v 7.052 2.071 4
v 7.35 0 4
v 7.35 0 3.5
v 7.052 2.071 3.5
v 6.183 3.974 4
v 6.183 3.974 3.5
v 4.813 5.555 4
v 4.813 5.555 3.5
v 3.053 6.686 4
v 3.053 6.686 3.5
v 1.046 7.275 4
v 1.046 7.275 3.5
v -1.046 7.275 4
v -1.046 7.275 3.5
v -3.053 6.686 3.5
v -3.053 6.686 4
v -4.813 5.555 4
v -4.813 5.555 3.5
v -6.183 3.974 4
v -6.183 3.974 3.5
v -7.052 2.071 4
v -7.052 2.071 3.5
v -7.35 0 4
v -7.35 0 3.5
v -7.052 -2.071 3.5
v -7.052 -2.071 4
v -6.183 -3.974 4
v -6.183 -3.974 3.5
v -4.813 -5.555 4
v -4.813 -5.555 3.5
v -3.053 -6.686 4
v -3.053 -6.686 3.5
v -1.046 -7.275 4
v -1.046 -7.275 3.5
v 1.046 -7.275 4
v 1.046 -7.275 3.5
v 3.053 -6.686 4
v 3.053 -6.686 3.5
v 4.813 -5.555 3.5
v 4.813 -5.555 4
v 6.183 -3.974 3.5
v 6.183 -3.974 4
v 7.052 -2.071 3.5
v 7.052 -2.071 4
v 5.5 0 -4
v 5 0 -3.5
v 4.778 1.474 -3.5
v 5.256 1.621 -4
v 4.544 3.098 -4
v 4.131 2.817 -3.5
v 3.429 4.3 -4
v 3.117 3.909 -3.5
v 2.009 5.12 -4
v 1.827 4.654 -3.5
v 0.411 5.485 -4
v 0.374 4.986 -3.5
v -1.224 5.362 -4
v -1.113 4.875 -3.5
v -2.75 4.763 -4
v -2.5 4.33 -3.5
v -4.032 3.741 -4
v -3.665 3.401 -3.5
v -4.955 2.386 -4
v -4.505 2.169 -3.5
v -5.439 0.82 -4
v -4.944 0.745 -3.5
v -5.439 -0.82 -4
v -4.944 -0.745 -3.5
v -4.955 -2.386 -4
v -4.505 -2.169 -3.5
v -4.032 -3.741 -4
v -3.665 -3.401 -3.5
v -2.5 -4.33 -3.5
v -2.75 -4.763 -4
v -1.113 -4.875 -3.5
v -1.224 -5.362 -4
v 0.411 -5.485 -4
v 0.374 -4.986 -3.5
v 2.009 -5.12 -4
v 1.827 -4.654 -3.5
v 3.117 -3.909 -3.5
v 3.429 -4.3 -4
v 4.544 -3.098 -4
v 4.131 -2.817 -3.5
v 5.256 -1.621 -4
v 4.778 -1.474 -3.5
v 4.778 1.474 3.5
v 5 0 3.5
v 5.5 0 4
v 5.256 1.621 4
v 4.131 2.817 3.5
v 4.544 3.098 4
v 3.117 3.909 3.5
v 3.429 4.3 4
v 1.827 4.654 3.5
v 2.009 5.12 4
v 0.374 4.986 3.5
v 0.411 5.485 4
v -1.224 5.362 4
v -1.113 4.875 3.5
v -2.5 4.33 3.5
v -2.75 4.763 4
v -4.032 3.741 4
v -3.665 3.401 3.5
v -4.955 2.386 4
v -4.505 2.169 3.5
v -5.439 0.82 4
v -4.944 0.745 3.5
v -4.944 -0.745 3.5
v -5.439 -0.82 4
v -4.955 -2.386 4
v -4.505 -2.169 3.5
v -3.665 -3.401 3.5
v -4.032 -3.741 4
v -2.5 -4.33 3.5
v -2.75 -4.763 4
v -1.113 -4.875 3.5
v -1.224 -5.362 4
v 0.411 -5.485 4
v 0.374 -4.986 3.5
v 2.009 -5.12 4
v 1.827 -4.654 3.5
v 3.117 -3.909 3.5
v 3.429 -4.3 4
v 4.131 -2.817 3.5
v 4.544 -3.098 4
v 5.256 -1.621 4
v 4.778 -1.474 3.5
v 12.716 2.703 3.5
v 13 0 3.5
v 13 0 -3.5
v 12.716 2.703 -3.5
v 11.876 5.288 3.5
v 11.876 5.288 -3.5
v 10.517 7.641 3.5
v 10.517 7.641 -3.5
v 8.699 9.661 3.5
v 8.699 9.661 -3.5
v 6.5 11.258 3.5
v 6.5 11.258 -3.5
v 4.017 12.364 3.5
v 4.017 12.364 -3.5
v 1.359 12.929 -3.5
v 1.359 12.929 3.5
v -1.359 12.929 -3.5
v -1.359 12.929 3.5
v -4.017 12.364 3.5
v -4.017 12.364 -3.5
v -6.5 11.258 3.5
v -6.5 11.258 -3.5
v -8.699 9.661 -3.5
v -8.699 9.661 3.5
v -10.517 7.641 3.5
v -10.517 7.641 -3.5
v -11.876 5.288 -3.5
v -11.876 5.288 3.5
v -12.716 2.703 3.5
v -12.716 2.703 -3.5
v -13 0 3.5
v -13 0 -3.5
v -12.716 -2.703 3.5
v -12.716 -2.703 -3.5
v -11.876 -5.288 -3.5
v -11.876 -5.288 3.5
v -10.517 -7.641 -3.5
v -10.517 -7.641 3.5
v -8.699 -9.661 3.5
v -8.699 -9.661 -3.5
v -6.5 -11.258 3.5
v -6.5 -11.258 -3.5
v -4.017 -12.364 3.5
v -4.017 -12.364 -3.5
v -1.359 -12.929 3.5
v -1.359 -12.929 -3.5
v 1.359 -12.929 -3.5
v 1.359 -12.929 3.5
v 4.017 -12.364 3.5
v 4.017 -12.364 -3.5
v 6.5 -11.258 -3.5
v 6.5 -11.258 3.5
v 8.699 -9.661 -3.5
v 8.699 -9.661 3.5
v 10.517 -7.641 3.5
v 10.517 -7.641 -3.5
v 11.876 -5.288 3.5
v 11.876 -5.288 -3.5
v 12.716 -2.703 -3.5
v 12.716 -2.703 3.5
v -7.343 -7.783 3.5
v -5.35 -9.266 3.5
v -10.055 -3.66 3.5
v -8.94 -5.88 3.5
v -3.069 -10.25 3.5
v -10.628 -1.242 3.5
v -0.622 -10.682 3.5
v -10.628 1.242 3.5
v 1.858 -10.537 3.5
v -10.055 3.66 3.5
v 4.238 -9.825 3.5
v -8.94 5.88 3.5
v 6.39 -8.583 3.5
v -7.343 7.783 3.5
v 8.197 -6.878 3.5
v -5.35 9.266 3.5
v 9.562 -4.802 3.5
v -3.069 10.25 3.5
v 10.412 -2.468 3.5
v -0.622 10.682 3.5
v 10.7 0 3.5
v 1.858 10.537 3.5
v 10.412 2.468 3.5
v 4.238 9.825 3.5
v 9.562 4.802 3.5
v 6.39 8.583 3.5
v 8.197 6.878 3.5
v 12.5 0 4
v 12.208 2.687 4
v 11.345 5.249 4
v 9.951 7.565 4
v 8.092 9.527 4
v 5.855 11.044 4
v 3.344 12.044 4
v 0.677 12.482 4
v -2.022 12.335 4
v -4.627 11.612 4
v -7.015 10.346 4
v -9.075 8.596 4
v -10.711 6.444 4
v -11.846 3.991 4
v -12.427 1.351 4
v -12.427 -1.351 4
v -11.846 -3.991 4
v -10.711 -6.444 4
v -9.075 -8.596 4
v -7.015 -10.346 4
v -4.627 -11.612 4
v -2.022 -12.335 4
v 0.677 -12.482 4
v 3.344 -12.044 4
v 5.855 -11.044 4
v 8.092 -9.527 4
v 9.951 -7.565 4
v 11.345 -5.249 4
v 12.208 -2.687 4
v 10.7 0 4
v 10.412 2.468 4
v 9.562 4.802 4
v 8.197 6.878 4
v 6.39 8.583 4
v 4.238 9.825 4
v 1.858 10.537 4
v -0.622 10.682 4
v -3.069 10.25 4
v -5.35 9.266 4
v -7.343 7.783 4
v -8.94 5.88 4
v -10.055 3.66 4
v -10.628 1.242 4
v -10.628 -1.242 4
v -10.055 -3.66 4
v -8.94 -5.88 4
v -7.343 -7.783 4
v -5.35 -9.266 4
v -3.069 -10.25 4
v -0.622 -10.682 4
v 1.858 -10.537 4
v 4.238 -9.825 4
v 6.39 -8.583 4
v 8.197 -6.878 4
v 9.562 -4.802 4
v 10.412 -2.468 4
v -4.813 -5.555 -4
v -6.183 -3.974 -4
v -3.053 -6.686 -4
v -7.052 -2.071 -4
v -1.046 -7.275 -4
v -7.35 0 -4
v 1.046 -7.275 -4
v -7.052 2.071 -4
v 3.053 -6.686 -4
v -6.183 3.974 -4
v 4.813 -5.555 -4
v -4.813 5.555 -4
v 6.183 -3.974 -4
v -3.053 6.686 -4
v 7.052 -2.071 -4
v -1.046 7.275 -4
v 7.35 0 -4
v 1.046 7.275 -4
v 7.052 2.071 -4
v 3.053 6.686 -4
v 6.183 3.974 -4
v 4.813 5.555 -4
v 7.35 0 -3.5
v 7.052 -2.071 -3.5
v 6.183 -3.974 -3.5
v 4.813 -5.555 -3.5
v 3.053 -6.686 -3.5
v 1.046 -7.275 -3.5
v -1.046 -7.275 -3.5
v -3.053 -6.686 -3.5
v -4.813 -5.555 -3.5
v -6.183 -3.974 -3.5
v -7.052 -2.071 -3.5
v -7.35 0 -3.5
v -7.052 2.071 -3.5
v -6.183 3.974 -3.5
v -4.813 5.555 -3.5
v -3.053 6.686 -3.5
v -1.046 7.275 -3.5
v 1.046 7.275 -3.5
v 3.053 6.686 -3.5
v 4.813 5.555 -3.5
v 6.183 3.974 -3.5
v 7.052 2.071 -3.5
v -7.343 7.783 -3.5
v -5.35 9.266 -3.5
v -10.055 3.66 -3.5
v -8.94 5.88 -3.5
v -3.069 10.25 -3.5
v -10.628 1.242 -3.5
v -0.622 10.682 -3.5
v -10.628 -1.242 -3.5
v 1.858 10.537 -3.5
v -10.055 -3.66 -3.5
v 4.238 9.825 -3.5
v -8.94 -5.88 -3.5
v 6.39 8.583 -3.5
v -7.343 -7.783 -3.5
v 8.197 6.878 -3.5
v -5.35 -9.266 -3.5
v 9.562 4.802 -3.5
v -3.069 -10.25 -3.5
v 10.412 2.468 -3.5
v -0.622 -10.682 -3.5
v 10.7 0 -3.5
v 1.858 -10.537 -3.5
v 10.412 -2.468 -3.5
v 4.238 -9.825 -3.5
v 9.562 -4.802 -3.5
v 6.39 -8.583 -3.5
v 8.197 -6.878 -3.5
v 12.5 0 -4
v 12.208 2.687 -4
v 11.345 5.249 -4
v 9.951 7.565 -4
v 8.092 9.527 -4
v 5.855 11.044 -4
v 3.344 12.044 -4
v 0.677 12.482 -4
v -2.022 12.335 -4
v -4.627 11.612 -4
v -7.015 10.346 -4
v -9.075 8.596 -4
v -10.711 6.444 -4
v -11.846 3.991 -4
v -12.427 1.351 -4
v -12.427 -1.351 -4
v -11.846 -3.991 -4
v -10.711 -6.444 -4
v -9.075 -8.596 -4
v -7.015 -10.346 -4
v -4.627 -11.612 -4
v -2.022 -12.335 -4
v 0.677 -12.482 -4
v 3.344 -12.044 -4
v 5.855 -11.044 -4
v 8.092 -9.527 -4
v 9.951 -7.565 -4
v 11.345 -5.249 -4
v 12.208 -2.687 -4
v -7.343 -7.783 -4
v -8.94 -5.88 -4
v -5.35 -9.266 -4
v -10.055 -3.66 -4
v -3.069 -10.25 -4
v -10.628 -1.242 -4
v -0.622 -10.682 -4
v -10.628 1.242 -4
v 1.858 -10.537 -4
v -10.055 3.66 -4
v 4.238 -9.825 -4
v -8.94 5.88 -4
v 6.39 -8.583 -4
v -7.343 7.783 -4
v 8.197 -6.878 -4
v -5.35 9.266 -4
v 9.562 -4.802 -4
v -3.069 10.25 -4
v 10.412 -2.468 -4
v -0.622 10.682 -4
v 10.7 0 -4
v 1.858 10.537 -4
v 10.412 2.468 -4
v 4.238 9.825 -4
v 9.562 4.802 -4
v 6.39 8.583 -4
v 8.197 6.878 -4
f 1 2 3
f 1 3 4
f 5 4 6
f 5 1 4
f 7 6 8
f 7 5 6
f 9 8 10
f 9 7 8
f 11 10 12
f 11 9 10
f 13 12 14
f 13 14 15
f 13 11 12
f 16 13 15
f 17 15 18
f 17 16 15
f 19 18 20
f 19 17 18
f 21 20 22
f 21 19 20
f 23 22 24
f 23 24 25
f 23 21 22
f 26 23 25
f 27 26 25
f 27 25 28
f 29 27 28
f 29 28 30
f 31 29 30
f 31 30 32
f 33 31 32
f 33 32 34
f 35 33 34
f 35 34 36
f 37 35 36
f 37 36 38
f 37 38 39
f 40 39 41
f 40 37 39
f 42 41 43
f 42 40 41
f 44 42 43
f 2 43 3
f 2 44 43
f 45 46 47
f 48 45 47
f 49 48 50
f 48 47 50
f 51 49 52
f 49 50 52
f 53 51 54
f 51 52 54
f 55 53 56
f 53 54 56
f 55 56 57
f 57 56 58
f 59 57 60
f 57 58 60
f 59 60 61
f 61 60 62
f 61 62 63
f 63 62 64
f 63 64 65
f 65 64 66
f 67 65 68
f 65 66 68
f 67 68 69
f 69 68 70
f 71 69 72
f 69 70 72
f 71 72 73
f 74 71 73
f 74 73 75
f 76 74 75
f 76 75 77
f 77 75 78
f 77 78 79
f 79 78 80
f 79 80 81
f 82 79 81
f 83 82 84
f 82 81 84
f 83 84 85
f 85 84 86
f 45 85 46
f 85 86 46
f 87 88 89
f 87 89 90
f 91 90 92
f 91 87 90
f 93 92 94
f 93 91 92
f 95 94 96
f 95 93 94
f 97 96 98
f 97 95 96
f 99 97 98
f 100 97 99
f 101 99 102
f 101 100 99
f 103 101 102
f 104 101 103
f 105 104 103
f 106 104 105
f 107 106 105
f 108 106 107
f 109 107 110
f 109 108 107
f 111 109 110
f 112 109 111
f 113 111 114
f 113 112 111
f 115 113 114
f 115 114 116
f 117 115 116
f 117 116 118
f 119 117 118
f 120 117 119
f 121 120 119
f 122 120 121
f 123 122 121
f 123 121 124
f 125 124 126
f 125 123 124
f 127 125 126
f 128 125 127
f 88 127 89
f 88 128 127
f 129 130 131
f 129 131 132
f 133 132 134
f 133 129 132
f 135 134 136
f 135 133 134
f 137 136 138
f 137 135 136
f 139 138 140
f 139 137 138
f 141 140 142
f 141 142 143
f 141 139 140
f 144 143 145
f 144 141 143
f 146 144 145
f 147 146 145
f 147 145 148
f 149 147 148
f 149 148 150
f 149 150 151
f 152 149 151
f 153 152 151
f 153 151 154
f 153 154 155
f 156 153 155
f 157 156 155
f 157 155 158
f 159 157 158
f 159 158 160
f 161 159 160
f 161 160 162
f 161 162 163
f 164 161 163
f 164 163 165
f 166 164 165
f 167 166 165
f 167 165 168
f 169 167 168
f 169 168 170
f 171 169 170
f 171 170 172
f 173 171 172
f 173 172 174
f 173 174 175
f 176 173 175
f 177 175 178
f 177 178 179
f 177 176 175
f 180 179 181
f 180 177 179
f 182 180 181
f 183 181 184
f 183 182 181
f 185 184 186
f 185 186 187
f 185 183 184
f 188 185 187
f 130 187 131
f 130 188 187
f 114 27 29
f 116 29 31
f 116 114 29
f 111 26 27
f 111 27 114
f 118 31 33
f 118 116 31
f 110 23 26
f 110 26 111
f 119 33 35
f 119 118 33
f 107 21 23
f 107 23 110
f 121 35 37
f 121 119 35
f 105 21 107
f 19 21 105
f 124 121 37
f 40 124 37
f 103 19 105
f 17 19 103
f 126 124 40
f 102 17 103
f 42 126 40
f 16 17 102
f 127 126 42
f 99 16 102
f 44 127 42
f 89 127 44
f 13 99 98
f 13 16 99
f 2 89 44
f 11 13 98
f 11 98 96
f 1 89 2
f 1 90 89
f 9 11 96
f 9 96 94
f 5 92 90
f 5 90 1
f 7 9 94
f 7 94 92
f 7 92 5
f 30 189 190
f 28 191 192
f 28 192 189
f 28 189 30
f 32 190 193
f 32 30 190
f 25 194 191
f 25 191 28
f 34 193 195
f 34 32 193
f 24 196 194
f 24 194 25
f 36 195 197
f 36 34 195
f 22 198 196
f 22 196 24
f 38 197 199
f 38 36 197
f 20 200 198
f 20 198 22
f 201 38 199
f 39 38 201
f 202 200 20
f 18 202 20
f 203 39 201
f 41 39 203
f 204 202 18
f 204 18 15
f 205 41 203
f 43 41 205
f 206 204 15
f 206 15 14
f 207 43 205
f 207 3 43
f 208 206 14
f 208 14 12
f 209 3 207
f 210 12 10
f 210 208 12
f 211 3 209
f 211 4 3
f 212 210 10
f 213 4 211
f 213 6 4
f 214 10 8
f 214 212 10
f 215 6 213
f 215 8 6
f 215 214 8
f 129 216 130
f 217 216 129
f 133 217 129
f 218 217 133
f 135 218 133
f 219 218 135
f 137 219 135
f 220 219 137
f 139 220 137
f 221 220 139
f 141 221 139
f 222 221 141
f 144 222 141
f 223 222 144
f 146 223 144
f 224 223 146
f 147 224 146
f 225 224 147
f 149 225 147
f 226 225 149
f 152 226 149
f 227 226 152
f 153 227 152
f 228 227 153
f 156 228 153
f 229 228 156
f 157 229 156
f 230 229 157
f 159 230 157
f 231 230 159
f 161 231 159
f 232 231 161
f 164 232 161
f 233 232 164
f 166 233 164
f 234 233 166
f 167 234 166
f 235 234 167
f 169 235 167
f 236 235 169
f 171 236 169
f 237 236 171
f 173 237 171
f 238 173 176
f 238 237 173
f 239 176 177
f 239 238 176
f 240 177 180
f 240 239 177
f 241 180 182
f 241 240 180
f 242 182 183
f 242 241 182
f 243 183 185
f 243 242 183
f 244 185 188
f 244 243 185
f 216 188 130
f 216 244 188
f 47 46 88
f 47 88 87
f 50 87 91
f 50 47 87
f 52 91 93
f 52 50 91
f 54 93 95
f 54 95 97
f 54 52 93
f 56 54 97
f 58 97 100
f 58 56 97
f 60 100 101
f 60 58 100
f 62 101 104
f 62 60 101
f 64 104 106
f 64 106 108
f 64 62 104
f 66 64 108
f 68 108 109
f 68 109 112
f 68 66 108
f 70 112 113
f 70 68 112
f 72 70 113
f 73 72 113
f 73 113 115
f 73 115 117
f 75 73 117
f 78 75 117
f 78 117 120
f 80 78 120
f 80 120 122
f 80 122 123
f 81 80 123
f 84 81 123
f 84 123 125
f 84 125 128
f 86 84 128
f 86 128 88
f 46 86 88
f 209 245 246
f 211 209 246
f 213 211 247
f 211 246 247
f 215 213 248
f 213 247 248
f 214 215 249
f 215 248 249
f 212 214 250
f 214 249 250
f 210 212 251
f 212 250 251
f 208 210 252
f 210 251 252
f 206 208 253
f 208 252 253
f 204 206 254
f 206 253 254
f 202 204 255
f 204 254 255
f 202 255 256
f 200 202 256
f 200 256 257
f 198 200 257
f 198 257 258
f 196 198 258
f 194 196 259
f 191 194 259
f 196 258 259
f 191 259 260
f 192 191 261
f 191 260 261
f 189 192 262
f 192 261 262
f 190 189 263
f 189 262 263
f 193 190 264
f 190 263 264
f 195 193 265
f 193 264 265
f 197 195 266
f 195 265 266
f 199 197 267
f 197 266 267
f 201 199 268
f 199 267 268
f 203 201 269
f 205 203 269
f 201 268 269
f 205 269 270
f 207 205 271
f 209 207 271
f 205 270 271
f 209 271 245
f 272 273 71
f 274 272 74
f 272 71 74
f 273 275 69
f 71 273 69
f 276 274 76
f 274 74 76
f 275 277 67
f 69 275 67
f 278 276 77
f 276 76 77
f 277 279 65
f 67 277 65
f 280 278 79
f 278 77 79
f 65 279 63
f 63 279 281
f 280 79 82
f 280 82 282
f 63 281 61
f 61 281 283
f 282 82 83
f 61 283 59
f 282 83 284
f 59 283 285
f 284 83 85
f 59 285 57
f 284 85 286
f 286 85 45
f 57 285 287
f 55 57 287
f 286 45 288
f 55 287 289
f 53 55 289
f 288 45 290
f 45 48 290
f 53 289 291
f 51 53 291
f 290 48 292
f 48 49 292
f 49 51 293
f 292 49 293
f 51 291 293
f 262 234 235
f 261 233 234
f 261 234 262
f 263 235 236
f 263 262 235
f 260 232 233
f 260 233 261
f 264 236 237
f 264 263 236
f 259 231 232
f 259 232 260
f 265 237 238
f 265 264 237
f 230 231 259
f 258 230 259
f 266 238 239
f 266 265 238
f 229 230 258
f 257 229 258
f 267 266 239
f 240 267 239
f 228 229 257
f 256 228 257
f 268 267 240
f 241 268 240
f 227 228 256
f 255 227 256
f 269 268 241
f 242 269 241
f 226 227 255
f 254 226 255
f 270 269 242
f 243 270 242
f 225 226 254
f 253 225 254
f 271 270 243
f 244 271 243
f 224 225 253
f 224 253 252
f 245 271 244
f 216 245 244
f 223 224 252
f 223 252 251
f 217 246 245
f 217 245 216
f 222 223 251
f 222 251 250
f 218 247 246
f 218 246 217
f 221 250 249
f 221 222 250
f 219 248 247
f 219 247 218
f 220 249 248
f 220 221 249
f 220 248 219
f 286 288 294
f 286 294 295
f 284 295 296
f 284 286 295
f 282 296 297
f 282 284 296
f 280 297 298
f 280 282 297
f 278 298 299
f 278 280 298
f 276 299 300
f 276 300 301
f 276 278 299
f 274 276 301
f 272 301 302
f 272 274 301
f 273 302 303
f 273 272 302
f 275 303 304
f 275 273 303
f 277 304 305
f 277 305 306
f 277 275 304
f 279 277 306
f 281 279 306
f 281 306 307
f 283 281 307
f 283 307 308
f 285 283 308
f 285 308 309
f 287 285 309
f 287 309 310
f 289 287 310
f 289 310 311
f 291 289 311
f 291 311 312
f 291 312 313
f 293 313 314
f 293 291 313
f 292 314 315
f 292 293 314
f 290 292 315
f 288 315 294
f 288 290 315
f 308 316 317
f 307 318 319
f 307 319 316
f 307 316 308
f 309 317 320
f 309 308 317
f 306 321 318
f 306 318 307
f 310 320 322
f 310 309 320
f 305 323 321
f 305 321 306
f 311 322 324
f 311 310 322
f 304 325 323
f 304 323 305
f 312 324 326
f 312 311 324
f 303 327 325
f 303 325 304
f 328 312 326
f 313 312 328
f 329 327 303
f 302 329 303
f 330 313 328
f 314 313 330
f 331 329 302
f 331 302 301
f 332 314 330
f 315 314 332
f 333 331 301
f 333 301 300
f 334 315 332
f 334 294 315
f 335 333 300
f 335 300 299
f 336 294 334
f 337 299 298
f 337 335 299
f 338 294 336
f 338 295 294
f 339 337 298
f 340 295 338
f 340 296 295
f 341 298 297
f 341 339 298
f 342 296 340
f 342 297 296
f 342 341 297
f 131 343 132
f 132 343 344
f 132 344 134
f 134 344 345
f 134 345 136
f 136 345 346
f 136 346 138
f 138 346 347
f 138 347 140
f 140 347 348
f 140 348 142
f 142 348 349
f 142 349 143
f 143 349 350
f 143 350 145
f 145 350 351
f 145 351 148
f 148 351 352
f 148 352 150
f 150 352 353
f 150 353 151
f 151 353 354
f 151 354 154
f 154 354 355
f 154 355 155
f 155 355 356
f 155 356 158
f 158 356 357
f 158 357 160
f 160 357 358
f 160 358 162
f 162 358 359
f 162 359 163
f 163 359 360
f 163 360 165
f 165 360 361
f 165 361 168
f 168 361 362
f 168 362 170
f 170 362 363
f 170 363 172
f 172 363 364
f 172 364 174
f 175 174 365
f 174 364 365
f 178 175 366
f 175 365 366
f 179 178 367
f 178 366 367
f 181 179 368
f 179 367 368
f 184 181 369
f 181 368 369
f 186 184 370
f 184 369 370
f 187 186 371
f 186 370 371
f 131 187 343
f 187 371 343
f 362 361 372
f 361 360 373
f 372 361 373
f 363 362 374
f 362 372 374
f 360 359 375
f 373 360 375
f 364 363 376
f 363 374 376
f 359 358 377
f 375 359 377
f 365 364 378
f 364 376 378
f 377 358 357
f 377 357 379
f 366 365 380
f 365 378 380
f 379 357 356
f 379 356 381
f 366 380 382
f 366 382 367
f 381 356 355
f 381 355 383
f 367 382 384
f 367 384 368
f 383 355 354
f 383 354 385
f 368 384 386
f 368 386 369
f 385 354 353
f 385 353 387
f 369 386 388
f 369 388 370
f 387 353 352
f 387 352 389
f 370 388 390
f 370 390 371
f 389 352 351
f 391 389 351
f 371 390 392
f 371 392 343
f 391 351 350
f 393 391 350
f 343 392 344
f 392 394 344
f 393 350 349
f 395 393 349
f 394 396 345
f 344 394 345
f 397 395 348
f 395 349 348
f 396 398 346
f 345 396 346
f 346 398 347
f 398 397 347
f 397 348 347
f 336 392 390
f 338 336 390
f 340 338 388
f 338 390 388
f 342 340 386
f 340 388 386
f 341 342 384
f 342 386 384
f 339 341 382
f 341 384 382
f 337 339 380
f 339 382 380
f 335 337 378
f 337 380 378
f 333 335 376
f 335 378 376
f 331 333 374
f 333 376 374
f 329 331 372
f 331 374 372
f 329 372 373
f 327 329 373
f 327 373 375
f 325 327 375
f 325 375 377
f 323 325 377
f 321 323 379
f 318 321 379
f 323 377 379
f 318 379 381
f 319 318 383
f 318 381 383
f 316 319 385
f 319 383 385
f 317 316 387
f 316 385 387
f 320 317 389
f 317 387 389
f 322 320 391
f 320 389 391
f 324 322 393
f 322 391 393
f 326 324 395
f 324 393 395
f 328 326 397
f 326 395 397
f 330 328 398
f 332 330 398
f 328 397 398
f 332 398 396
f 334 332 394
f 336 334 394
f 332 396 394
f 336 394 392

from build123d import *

# Parameters (mm, degrees)
F0_R     = 13
F0_R_2   = 5
F1_DEPTH = 4
F2_R     = 10.7
F2_R_2   = 7.35
F3_DEPTH = 0.5
F4_R     = 10.7
F4_R_2   = 7.35
F5_DEPTH = 0.5
F6_SIZE  = 0.5


with BuildPart() as f1:
    # F0 (on Top) → F1 (new body, symmetric)
    with BuildSketch(Plane.XY):
        Circle(F0_R)
        Circle(F0_R_2, mode=Mode.SUBTRACT)
    extrude(amount=F1_DEPTH, both=True)

    # F2 (on face) → F3 (cut)
    with BuildSketch(Plane(origin=(0, 0, -4), x_dir=(1, 0, 0), z_dir=(0, 0, -1))):
        Circle(F2_R)
        Circle(F2_R_2, mode=Mode.SUBTRACT)
    extrude(amount=-F3_DEPTH, mode=Mode.SUBTRACT)

    # F4 (on face) → F5 (cut)
    with BuildSketch(Plane.XY.offset(4)):
        Circle(F4_R)
        Circle(F4_R_2, mode=Mode.SUBTRACT)
    extrude(amount=-F5_DEPTH, mode=Mode.SUBTRACT)

    # F6
    f6_edges = [f1.edges().sort_by_distance(p)[0] for p in [
        (-13, 0, -4),
        (-13, 0, 4),
        (-5, 0, -4),
        (-5, 0, 4),
    ]]
    chamfer(f6_edges, length=F6_SIZE)


solid = f1.part
